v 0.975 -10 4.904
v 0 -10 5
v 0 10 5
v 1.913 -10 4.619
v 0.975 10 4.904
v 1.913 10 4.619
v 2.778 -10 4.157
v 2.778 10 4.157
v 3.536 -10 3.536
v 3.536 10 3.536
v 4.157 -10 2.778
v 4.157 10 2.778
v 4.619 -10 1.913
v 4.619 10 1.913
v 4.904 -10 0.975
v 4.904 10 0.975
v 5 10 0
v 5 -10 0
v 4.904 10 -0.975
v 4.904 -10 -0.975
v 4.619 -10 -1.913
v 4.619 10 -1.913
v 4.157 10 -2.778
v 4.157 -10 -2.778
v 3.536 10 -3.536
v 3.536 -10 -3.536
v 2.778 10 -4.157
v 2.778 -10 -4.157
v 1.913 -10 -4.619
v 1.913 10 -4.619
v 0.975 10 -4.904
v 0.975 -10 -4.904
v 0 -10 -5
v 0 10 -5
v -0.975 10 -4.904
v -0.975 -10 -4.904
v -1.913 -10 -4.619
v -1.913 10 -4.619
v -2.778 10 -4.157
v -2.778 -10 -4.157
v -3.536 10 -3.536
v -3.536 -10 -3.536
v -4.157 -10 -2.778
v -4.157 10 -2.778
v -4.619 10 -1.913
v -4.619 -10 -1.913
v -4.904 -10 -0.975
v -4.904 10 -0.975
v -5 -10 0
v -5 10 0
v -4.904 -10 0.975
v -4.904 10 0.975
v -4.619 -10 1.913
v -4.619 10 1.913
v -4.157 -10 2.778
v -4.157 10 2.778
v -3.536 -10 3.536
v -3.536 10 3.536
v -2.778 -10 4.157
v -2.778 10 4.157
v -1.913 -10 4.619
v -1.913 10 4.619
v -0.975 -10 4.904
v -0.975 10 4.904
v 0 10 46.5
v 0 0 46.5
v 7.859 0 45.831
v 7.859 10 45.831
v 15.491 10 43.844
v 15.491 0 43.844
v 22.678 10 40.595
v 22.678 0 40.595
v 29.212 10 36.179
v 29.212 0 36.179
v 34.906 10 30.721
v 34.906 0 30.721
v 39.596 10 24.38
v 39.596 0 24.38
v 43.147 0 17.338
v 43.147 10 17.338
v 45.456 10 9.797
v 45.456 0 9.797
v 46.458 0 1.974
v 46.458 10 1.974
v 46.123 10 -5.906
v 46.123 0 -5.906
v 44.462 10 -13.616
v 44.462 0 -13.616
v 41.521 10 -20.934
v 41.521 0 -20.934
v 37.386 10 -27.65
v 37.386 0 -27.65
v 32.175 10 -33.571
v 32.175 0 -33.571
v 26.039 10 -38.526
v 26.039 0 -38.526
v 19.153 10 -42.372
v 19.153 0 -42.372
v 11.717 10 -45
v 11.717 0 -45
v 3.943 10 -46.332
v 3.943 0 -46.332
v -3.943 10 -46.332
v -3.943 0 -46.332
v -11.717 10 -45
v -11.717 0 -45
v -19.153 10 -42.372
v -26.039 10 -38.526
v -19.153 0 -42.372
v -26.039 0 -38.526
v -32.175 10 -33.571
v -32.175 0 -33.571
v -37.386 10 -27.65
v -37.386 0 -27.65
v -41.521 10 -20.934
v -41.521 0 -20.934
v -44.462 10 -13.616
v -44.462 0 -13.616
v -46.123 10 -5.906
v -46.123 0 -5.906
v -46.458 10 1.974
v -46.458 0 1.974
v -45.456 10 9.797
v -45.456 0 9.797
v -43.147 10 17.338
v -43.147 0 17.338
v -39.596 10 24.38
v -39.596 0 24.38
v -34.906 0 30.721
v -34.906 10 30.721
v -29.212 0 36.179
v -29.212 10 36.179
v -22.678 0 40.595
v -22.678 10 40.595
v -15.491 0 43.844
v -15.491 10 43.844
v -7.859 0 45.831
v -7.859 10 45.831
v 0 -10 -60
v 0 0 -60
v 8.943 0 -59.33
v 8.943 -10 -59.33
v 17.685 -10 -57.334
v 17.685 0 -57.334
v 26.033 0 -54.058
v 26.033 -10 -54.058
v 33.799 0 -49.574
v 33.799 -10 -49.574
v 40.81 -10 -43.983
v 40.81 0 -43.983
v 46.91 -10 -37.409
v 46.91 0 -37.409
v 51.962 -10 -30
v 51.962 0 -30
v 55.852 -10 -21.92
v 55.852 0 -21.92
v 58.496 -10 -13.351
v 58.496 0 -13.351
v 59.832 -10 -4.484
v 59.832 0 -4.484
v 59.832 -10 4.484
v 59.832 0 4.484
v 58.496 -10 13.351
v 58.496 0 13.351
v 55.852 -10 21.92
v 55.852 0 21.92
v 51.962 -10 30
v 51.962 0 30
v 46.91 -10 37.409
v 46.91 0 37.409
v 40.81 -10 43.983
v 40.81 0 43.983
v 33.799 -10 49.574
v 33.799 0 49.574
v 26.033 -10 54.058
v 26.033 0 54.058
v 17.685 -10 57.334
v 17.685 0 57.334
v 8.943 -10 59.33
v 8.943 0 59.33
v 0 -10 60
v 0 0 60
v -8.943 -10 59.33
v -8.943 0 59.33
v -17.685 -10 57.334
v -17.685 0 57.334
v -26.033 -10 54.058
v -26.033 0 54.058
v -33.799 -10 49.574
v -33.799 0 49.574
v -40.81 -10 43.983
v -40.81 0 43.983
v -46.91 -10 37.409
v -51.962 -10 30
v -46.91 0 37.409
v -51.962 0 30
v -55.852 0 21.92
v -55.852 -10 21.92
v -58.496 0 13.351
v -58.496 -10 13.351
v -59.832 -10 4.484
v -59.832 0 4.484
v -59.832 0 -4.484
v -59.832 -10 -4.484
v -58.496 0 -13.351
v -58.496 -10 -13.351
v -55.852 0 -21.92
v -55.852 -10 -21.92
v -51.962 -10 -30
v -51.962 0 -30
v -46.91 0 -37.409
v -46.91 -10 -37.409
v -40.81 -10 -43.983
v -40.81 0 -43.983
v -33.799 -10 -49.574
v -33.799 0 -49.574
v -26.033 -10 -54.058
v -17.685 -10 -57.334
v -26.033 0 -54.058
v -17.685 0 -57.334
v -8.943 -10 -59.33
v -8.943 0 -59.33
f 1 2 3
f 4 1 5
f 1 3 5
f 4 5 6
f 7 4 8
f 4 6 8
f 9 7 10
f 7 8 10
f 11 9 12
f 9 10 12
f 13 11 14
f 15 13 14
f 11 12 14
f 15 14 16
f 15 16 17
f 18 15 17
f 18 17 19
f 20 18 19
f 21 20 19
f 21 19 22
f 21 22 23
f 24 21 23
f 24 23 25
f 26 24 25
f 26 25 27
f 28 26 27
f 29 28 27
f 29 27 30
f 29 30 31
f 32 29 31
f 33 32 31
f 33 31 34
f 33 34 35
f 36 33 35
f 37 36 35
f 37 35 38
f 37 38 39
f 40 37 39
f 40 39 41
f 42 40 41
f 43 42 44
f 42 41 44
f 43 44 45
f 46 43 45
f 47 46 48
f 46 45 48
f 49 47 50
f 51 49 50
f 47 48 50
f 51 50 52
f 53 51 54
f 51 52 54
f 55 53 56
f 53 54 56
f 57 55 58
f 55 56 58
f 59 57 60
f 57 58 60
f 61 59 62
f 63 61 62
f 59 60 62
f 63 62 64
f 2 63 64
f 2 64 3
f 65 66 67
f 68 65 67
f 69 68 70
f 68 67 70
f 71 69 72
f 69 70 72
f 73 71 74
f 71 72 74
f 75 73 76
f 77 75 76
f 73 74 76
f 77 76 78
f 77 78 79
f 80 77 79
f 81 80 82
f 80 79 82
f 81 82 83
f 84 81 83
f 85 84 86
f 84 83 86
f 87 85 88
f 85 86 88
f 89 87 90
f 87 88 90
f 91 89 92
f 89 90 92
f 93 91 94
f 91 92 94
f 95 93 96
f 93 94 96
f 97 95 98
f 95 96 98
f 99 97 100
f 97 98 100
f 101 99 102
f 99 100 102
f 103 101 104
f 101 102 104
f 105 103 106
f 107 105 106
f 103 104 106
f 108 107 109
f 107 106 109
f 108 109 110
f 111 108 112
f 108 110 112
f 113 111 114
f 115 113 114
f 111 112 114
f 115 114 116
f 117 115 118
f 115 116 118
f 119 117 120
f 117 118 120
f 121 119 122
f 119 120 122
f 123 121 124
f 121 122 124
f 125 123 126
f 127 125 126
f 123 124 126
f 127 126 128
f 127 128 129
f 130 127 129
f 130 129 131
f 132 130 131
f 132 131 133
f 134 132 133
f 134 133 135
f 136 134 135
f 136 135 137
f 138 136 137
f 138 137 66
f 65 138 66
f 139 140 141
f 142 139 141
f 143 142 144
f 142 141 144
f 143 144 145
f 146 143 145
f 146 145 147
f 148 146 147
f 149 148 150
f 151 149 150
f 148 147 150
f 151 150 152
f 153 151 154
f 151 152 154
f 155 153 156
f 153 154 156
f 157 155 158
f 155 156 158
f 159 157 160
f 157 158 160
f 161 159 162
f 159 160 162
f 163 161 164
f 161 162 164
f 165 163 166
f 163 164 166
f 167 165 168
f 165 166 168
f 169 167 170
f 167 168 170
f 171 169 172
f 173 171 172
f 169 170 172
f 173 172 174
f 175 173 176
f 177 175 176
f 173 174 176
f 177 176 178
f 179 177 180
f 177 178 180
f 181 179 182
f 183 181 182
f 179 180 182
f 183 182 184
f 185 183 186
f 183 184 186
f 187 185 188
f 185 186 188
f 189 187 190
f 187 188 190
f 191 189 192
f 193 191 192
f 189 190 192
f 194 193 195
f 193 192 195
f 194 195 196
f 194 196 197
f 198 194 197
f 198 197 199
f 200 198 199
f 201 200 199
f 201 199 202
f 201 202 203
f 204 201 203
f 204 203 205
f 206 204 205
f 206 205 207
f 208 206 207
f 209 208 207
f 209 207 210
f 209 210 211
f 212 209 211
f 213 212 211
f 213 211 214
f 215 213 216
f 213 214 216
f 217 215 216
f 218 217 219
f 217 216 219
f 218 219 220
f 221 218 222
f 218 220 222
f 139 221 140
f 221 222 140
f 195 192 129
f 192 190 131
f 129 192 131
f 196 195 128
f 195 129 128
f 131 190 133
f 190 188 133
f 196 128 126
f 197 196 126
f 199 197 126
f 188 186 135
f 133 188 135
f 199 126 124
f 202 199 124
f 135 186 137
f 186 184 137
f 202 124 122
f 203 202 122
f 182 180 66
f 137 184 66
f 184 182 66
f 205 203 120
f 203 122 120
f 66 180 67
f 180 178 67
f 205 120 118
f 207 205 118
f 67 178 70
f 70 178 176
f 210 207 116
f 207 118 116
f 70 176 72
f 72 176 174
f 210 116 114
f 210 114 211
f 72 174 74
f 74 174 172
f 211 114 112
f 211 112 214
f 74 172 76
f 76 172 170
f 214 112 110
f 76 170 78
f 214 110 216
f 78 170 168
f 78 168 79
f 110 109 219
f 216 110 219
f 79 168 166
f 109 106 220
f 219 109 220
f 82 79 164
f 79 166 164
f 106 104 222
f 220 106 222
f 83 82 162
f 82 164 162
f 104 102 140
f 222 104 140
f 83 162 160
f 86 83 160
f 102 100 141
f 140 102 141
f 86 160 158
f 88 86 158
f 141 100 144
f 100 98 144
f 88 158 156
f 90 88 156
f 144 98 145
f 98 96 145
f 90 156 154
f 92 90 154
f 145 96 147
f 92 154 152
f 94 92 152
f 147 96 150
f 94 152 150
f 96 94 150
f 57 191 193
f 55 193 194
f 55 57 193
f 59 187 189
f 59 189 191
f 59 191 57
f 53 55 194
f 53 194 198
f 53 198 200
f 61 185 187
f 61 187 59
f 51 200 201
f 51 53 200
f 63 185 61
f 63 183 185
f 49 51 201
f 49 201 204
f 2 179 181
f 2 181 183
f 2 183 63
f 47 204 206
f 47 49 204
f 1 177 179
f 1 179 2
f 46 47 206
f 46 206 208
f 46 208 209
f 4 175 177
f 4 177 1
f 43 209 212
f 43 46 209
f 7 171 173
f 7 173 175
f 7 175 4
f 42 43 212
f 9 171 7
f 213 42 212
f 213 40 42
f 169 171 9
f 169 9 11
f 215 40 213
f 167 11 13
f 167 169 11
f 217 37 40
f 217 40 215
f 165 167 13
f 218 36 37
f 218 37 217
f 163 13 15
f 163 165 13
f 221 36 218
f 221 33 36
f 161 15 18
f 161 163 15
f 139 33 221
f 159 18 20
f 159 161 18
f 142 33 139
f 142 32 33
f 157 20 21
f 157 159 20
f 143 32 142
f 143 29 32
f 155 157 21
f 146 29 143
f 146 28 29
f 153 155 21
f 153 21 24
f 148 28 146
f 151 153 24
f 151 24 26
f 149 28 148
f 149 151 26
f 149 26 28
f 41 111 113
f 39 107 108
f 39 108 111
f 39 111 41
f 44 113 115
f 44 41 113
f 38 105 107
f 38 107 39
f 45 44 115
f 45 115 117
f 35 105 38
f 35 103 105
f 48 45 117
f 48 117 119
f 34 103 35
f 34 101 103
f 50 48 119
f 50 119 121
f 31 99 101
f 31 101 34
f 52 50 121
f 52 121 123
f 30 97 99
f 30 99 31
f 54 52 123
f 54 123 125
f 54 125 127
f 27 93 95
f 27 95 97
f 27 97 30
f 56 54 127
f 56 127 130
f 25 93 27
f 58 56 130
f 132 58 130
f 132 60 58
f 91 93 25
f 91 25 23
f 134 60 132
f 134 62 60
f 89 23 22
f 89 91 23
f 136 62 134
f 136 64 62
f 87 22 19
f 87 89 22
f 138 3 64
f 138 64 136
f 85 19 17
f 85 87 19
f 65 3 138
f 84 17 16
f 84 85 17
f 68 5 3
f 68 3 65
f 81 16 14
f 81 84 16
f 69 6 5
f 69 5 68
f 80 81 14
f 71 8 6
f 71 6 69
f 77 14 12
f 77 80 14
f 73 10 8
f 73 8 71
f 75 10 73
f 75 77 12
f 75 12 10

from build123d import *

# Parameters (mm, degrees)
ESQUISSE1_R             = 47.9
BOSS_EXTRU_1_DEPTH      = 10
ESQUISSE2_R             = 60
BOSS_EXTRU_2_DEPTH      = 10
ENL_V_START             = -10
ESQUISSE4_R             = 47.9
ESQUISSE4_R_2           = 46.5
ENL_V_MAT_EXTRU_1_DEPTH = 10
ESQUISSE5_R             = 5
ENL_V_MAT_EXTRU_2_DEPTH = 88.177978871


with BuildPart() as part:
    # Esquisse1 → Boss.-Extru.1 (new body)
    with BuildSketch(Plane(origin=(0, 0, 0), x_dir=(1, 0, 0), z_dir=(0, 1, 0))):
        with Locations(Location((0, 0, 0), (0, 0, 270))):
            Circle(ESQUISSE1_R)
    extrude(amount=BOSS_EXTRU_1_DEPTH)

    # Esquisse2 → Boss.-Extru.2 (add)
    with BuildSketch(Plane.XZ):
        with Locations(Location((0, 0, 0), (0, 0, 270))):
            Circle(ESQUISSE2_R)
    extrude(amount=BOSS_EXTRU_2_DEPTH)

    # Esquisse4 → Enlèv. mat.-Extru.1 (cut)
    with BuildSketch(Plane(origin=(0, 10, 0), x_dir=(1, 0, 0), z_dir=(0, 1, 0)).offset(ENL_V_START)):
        Circle(ESQUISSE4_R)
        with Locations(Location((0, 0, 0), (0, 0, 270))):
            Circle(ESQUISSE4_R_2, mode=Mode.SUBTRACT)
    extrude(amount=ENL_V_MAT_EXTRU_1_DEPTH, mode=Mode.SUBTRACT)

    # Esquisse5 → Enlèv. mat.-Extru.2 (cut, through all)
    with BuildSketch(Plane(origin=(0, 10, 0), x_dir=(1, 0, 0), z_dir=(0, 1, 0))):
        with Locations(Location((0, 0, 0), (0, 0, 270))):
            Circle(ESQUISSE5_R)
    extrude(amount=-ENL_V_MAT_EXTRU_2_DEPTH, mode=Mode.SUBTRACT)


solid = part.part
